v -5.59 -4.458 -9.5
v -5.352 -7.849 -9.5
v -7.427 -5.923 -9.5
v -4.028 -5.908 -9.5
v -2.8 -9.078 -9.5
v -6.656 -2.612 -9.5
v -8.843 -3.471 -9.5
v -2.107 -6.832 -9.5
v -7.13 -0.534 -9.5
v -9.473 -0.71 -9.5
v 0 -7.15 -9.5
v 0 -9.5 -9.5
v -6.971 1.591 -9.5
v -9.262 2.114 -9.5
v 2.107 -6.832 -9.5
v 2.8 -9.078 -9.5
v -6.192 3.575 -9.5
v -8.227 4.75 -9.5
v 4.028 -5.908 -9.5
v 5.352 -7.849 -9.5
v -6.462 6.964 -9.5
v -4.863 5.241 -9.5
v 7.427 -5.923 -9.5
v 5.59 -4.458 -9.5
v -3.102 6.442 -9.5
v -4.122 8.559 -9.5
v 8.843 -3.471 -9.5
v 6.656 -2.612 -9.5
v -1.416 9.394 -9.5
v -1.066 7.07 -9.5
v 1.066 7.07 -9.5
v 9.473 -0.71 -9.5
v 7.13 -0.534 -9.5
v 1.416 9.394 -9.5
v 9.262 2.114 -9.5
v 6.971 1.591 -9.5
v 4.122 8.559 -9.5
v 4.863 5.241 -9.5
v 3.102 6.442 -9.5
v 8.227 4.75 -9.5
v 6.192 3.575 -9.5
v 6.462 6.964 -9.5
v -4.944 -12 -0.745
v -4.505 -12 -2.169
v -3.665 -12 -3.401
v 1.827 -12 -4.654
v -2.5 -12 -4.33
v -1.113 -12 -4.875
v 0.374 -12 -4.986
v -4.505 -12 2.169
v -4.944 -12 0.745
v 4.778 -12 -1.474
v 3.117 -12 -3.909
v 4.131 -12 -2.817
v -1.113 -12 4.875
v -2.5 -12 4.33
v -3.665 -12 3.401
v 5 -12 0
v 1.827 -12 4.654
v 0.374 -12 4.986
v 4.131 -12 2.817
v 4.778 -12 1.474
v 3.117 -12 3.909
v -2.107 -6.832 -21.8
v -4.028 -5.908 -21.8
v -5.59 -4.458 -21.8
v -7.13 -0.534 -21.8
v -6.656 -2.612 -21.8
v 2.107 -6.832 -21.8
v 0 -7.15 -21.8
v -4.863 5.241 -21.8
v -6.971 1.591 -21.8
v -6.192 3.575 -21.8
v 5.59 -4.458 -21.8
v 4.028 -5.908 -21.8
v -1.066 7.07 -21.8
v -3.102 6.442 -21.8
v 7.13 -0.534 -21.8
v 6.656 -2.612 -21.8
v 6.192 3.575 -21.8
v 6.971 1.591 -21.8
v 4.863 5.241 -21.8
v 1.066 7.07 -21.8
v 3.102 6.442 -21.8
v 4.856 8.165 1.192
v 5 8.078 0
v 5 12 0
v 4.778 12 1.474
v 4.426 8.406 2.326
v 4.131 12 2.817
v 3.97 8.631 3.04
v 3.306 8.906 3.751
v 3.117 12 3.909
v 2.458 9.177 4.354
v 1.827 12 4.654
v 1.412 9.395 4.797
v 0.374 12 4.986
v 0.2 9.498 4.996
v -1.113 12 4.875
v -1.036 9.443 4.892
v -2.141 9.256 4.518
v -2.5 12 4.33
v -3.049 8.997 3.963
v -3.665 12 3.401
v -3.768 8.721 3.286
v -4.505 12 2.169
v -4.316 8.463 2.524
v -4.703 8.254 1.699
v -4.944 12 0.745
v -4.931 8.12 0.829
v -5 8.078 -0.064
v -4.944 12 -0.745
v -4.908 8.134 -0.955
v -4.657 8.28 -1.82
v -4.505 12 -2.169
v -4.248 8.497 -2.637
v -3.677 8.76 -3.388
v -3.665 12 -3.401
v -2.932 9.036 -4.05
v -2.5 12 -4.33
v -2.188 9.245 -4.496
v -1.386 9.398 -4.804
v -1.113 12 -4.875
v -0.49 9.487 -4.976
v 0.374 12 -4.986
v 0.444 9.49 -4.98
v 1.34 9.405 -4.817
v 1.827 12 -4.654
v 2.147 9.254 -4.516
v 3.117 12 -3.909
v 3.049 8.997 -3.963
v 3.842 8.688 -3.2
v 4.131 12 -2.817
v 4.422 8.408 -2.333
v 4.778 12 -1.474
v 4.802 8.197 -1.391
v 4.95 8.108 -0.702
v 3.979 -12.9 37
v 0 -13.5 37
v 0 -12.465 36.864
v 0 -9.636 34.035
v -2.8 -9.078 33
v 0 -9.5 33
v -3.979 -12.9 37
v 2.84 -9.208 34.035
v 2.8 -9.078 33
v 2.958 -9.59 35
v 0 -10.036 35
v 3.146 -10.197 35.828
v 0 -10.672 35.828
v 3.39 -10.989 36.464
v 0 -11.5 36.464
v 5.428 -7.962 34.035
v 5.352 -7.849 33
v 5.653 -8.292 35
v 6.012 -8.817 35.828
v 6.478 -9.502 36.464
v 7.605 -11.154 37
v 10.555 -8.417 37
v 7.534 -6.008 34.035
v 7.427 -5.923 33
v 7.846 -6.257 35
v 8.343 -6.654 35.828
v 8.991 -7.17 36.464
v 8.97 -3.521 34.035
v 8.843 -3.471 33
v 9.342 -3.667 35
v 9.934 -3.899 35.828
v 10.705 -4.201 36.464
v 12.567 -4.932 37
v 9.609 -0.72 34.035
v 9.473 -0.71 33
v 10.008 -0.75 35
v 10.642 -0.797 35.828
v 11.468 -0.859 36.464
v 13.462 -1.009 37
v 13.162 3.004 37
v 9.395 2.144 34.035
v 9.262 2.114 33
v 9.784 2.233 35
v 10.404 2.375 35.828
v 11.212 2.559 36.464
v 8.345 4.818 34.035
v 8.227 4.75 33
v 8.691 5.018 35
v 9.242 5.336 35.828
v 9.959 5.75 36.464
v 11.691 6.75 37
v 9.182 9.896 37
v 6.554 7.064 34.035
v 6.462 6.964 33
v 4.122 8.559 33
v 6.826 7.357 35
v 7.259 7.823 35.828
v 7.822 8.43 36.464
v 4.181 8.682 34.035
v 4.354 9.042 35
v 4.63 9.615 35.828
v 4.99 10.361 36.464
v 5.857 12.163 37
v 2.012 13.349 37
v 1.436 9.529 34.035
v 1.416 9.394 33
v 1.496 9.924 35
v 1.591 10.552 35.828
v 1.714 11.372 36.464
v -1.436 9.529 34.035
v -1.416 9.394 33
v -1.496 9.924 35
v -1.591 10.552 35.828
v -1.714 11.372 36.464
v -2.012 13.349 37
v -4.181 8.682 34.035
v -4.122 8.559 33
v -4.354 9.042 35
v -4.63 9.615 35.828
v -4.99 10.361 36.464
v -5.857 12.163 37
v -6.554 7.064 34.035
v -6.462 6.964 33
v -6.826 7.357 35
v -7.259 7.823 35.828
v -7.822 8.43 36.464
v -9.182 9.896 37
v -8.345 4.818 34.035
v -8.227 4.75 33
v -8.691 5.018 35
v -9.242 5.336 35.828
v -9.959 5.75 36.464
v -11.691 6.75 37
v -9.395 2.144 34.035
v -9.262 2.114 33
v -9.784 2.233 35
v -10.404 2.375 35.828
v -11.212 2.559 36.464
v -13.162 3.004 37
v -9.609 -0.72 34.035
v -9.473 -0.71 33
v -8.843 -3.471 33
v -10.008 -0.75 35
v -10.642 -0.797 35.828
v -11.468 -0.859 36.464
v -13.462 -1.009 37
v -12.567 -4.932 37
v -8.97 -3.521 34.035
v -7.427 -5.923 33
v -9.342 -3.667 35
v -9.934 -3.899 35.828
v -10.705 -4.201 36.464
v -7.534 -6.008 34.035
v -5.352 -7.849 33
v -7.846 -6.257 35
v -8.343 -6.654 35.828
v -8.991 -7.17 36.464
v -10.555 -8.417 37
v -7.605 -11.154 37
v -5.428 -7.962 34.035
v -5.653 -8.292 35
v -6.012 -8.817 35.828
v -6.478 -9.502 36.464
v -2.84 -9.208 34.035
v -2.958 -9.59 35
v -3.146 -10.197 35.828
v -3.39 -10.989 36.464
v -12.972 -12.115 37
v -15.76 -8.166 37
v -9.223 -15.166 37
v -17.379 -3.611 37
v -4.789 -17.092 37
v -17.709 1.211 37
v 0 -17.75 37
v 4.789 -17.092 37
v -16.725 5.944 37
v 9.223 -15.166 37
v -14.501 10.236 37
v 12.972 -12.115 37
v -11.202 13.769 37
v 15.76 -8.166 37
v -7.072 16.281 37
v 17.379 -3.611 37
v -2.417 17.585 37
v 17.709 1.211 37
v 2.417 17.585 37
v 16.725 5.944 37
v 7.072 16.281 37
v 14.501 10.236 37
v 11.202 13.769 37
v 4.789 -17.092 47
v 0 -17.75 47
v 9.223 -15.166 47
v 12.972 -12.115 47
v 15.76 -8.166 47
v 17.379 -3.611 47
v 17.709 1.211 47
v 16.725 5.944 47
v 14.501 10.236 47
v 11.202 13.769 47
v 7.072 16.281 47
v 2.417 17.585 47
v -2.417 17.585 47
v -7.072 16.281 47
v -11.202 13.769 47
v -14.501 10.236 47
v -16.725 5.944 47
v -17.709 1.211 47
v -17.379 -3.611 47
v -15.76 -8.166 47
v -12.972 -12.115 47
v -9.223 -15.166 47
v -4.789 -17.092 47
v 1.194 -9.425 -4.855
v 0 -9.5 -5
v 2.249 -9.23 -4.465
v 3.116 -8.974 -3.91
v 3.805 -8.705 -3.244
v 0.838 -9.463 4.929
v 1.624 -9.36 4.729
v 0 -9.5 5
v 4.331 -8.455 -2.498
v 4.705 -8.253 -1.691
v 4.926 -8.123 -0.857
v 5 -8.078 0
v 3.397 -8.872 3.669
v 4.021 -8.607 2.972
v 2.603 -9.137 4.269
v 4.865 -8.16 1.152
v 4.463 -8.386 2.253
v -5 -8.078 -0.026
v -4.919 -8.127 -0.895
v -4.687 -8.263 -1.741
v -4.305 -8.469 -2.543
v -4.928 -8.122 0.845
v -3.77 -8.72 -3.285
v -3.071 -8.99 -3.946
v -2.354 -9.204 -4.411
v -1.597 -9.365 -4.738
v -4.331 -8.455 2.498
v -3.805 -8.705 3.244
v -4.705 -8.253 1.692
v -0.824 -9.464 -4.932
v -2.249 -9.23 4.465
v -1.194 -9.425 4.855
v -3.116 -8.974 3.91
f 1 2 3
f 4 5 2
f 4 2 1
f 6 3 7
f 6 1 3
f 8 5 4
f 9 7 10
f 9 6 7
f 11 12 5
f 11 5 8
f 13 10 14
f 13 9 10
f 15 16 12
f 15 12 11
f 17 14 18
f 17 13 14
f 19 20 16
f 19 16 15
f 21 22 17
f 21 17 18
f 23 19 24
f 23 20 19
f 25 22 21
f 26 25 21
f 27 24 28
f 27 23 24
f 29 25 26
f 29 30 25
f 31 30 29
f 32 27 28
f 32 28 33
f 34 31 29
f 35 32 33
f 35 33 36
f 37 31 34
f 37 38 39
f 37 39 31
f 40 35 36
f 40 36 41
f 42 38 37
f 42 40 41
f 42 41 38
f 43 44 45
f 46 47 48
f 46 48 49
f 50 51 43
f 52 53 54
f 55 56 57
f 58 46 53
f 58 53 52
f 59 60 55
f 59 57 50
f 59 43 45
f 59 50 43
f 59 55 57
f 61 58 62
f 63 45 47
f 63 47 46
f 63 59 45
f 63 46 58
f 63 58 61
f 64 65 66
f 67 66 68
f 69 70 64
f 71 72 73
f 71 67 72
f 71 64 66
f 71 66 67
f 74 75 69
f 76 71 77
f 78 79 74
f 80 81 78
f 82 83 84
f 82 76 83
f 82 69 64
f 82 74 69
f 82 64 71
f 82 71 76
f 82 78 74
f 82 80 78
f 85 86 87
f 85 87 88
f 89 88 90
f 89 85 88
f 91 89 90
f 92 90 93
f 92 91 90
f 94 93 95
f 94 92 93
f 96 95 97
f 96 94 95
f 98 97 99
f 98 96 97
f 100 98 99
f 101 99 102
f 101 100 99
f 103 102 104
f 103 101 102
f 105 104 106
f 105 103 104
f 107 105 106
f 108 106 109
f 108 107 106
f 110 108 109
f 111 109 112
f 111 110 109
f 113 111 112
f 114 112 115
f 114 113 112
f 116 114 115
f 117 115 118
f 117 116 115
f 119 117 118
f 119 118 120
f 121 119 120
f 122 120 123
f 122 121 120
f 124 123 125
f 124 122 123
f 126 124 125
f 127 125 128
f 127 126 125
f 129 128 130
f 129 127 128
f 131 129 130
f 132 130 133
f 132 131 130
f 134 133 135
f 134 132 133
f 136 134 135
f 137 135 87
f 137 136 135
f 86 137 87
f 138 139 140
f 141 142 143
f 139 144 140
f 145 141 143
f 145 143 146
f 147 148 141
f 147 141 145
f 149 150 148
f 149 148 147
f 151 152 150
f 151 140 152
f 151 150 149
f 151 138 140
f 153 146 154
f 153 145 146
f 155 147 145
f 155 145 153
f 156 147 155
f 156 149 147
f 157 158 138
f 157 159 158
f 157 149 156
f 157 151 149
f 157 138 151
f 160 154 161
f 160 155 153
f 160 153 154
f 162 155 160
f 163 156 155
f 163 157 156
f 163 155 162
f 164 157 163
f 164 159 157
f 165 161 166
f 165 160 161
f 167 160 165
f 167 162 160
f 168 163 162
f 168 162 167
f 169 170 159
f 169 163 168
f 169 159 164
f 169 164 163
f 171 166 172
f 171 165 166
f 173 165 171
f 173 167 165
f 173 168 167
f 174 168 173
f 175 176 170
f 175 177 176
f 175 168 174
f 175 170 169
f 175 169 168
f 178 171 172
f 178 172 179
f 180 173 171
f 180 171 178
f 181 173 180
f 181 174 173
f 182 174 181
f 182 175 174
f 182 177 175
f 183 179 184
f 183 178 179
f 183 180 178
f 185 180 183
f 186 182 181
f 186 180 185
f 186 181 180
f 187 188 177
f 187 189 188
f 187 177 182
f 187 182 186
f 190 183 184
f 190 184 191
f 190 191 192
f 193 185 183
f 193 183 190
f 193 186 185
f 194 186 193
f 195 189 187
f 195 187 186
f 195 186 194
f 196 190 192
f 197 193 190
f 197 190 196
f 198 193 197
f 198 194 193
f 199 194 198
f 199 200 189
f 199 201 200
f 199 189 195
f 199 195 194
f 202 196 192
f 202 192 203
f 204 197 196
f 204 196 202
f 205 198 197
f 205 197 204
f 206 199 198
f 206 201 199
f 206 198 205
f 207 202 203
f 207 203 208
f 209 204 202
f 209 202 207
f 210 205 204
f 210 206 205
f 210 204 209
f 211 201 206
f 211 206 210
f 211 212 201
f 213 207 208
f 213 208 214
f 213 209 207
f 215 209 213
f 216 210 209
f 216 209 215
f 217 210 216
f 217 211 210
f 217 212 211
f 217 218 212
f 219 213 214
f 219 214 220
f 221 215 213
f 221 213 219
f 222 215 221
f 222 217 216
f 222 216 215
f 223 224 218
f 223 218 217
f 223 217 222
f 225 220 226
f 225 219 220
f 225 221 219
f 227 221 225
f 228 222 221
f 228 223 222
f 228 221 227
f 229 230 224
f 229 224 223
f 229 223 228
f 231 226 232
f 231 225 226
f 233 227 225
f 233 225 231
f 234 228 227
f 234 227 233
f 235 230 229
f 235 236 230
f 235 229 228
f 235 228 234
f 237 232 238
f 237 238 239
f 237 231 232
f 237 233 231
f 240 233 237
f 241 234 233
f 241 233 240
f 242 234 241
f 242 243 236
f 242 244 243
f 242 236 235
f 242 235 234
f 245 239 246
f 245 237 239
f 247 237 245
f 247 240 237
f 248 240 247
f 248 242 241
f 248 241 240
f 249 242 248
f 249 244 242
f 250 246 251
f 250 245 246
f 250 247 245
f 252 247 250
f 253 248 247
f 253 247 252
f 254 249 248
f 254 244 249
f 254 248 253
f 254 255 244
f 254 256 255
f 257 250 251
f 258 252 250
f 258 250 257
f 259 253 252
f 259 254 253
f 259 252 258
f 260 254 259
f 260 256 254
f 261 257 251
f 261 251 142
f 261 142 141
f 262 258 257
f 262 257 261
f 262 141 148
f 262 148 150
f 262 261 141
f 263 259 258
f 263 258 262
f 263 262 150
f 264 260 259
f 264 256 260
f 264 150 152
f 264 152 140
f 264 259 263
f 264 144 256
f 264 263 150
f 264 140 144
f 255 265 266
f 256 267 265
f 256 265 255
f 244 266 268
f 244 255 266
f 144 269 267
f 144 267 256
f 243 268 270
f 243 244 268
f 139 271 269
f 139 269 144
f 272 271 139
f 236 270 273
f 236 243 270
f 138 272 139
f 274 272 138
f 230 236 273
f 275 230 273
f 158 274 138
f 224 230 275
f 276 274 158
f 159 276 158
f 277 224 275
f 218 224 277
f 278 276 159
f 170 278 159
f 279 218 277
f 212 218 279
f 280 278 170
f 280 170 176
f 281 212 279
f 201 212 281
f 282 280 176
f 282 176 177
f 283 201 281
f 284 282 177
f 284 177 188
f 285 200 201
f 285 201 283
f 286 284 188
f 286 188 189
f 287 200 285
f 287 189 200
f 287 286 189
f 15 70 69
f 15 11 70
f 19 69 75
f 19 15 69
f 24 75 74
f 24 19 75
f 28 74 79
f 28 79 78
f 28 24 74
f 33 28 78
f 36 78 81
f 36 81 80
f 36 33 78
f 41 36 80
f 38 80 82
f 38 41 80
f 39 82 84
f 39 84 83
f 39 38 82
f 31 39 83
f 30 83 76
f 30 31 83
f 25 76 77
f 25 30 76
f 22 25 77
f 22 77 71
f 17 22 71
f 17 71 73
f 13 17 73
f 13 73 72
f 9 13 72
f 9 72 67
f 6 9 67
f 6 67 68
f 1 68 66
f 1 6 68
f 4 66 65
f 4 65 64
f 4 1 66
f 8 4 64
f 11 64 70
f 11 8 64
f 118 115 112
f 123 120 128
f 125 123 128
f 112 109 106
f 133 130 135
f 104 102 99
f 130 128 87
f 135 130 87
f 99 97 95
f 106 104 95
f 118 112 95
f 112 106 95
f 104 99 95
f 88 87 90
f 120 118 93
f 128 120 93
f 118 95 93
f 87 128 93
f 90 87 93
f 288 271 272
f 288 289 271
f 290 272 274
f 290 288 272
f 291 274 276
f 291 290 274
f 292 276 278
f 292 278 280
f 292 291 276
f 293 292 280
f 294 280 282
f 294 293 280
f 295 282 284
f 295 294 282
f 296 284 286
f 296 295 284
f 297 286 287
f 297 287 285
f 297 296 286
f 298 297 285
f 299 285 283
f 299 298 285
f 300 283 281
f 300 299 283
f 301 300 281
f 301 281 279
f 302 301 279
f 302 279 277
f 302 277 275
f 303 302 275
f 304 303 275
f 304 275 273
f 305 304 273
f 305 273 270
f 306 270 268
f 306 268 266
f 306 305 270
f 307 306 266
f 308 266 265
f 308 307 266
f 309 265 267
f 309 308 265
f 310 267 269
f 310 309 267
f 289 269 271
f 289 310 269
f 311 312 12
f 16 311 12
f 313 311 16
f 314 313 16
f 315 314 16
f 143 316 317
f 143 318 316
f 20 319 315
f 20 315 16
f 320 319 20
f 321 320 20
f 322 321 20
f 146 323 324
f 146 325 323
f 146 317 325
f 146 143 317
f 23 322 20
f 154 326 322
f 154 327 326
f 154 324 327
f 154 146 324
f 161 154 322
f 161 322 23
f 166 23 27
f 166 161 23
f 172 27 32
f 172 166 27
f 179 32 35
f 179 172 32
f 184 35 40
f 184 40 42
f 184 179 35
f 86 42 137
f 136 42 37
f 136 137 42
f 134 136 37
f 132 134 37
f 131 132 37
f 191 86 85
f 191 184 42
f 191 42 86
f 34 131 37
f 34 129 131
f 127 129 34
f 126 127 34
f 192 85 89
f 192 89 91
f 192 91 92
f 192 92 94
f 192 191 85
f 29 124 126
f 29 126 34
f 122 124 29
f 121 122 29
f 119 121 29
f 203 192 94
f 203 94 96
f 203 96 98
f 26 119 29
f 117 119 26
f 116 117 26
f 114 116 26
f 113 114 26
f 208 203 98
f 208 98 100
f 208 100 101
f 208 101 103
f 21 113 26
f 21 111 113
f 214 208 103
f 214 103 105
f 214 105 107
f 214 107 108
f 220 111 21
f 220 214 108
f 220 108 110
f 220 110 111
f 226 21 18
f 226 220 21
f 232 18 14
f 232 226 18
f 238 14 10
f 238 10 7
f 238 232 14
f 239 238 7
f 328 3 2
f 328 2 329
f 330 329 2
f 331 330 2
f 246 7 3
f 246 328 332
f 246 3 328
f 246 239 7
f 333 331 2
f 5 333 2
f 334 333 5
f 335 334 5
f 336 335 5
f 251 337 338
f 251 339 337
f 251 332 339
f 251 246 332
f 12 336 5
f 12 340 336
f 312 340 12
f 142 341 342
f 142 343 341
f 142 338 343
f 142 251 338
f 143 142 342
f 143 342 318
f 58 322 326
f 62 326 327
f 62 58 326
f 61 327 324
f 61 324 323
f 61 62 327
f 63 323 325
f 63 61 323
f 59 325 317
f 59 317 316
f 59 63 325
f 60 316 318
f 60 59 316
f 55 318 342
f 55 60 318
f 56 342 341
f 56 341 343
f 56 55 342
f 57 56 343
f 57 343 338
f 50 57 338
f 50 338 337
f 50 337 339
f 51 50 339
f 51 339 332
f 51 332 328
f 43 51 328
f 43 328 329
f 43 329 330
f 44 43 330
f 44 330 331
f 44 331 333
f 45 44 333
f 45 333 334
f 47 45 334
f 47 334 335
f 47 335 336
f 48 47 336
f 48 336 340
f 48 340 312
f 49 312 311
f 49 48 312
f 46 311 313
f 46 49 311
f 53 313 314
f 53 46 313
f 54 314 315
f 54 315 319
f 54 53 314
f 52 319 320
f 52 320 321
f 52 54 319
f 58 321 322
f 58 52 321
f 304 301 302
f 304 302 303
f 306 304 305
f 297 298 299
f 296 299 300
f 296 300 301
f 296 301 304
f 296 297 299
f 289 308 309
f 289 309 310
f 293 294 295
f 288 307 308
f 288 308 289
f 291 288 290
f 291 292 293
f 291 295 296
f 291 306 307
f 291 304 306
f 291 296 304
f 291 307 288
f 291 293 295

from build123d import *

# Parameters (mm, degrees)
SKETCH102_R  = 5
PAD032_DEPTH = 12
FILLET001_R  = 4


with BuildPart() as part:
    # Sketch101 → Revolution001 (revolve)
    with BuildSketch(Plane.YZ):
        Polygon((-7.15, -9.5), (-9.5, -9.5), (-9.5, 37), (-17.75, 37), (-17.75, 47), (0, 47), (0, -21.8), (-7.15, -21.8), align=None)
    revolve(axis=Axis((0, 0, 0), (0, 0, 1)))

    # Sketch102 → Pad032 (new body, symmetric)
    with BuildSketch(Plane.XZ):
        Circle(SKETCH102_R)
    extrude(amount=PAD032_DEPTH, both=True)

    # Fillet001
    fillet001_edges = [part.edges().sort_by_distance(p)[0] for p in [
        (0, 9.5, 37),
    ]]
    fillet(fillet001_edges, radius=FILLET001_R)


solid = part.part
